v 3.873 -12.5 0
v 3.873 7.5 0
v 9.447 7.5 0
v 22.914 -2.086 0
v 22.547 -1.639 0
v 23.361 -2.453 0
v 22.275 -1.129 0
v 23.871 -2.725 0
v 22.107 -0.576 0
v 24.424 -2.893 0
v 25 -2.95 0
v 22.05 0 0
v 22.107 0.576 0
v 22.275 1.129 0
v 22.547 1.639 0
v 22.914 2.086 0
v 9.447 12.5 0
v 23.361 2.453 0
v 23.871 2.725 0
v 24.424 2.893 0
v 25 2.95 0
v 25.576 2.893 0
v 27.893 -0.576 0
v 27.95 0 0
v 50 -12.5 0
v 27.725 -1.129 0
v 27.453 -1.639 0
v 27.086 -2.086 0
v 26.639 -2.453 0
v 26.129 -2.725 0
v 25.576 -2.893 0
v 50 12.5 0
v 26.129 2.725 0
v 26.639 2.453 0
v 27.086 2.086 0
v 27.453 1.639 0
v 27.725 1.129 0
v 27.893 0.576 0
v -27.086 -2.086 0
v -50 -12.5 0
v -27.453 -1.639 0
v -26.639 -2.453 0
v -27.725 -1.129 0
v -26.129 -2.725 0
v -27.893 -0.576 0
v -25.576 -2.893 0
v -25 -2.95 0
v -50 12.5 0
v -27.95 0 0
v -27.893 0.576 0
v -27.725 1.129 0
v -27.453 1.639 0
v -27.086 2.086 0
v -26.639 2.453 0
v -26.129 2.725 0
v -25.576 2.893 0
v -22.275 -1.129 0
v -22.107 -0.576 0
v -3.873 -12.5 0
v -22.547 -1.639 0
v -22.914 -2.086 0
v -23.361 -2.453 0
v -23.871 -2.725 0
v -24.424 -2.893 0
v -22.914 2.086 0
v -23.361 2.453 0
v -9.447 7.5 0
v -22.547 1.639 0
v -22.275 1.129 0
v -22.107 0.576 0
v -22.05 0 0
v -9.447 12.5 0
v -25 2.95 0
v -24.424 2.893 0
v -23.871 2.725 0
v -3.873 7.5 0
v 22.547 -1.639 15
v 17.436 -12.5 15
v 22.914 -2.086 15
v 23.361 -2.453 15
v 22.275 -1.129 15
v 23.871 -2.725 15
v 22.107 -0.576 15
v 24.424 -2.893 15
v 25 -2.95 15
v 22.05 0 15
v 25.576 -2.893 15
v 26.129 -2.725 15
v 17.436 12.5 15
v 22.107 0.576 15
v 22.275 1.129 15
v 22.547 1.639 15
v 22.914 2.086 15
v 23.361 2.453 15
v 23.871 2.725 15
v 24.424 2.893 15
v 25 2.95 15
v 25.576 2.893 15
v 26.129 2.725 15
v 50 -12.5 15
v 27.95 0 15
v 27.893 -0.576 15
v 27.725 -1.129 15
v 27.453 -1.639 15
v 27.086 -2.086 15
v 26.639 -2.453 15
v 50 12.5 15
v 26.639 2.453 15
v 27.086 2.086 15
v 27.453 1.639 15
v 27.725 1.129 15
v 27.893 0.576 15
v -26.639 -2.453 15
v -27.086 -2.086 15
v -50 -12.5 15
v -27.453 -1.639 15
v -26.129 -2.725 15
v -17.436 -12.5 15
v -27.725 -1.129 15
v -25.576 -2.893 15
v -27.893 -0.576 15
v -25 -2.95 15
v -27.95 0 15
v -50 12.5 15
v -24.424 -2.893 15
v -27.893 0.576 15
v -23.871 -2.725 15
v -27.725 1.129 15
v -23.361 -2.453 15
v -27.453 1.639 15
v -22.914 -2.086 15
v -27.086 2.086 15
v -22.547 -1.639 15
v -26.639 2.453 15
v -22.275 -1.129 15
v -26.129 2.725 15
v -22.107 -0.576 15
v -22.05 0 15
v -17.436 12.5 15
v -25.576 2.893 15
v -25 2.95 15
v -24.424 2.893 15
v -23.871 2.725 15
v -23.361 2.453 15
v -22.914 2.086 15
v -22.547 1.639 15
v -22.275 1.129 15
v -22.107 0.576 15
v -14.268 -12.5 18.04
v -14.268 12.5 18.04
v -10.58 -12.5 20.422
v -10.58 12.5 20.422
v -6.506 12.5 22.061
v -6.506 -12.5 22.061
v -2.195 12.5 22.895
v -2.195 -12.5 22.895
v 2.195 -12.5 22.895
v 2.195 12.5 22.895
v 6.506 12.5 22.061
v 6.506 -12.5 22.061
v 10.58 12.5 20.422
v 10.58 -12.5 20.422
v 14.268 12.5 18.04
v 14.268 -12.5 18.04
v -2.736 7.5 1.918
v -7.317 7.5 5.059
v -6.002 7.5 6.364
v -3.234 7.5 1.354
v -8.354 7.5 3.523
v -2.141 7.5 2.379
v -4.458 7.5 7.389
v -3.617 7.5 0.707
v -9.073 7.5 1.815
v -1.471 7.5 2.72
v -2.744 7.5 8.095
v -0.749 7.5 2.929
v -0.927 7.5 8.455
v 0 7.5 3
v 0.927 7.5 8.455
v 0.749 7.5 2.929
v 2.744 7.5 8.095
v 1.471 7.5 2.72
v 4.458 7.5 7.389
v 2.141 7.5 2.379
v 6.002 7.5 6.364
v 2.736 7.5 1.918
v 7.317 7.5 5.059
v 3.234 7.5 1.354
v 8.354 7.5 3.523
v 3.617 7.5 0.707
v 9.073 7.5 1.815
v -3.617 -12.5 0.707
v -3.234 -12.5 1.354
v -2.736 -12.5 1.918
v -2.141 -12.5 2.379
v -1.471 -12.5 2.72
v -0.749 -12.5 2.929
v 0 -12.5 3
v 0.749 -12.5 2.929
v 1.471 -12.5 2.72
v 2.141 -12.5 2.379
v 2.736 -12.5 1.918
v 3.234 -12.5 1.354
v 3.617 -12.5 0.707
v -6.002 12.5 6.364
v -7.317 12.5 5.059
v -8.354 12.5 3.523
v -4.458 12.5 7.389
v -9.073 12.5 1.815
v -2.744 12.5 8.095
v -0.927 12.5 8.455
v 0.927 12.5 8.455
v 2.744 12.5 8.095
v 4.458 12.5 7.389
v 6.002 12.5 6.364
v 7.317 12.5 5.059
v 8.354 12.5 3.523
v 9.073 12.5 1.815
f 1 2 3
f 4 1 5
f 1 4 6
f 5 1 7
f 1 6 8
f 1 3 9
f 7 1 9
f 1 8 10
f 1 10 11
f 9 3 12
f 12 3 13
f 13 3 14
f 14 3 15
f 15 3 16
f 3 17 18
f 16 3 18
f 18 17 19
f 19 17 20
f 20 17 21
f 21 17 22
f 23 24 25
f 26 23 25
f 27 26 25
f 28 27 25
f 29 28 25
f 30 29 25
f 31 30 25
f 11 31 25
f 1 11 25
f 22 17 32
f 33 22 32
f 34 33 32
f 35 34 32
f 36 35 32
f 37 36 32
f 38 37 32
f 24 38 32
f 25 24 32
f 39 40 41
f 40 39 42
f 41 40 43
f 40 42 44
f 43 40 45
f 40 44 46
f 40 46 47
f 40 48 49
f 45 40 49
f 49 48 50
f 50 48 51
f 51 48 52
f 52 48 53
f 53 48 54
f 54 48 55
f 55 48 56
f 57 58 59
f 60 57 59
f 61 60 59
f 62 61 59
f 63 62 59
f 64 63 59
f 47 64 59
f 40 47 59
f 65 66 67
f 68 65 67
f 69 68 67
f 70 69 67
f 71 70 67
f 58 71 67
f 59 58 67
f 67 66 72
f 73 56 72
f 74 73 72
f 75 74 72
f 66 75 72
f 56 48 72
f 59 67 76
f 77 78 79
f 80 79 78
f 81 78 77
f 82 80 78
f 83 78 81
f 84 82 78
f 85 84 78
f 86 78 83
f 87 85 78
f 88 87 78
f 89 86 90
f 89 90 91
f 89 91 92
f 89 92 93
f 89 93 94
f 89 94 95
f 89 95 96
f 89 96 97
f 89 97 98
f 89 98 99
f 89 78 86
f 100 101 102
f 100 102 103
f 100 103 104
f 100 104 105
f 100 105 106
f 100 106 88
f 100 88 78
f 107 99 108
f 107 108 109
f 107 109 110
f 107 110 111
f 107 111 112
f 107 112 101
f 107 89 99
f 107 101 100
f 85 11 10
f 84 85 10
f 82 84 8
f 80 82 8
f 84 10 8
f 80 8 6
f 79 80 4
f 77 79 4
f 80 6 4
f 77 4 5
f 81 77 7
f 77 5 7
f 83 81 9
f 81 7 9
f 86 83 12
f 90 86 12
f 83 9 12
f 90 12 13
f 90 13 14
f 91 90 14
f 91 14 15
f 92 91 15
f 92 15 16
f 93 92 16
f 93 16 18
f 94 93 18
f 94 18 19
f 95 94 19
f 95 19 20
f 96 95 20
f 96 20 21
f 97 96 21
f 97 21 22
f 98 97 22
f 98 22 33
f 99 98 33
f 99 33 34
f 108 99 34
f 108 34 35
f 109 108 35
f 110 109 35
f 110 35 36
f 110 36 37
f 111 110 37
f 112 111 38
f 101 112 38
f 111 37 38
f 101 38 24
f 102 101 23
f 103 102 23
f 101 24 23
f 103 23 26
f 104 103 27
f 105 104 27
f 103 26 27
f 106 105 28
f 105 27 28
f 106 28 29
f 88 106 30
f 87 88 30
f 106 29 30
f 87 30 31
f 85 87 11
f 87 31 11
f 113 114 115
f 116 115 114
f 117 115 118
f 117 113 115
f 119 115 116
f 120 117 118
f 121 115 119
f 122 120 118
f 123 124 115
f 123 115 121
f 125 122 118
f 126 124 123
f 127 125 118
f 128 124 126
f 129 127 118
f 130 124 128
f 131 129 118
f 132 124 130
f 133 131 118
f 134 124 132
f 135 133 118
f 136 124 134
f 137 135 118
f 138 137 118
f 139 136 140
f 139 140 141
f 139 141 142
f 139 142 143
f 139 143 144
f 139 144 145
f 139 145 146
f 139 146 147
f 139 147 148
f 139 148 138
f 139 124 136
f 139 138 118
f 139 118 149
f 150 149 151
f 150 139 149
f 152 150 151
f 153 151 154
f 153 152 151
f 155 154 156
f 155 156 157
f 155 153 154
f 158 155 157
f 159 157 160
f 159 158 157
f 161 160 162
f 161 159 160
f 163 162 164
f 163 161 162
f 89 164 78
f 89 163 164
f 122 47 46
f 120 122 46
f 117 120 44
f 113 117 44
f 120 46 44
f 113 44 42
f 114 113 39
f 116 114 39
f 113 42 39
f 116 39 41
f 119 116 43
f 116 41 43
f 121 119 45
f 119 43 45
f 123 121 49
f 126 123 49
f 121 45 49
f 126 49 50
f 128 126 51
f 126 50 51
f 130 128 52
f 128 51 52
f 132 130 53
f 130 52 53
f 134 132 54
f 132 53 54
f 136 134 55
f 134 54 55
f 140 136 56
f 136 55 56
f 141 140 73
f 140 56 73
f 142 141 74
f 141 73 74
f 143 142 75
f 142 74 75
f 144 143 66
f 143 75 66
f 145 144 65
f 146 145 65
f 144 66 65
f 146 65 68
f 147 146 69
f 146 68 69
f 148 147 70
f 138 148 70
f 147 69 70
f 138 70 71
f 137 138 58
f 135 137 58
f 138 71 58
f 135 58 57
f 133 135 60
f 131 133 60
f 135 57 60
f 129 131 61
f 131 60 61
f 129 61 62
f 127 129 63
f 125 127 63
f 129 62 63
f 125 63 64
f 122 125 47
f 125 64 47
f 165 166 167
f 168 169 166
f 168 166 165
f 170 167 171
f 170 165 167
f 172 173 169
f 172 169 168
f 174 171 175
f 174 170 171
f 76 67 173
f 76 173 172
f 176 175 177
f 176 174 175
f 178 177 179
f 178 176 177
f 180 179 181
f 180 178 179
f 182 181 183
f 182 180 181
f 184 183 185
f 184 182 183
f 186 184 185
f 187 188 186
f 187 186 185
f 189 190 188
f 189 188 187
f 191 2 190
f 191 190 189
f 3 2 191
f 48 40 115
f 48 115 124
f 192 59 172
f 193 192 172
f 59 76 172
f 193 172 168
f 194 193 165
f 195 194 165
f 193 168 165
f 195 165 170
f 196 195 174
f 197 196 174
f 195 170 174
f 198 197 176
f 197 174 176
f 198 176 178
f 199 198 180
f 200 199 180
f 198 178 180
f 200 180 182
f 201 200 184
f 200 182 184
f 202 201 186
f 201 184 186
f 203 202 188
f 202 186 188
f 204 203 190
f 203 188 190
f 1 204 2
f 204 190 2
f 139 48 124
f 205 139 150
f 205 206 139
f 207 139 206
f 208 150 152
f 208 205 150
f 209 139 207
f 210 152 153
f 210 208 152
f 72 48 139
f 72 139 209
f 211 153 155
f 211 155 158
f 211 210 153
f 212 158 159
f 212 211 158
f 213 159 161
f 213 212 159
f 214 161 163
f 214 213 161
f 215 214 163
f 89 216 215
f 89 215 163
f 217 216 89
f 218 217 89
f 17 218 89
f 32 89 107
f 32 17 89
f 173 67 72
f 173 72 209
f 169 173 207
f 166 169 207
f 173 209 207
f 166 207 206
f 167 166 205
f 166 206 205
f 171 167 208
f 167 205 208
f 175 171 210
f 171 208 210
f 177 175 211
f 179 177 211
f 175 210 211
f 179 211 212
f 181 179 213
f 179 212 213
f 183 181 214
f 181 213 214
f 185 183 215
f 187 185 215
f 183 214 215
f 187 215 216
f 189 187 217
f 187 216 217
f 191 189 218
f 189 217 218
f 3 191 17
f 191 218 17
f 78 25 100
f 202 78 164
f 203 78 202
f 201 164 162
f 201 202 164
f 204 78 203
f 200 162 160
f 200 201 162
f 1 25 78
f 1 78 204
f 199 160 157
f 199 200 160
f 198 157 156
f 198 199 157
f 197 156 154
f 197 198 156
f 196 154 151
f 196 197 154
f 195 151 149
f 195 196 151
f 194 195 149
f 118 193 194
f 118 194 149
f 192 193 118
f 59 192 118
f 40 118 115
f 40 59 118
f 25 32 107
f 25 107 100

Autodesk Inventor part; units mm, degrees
ref_plane "YZ Plane" through (0, 0, 0) normal (1, 0, 0) x (0, 1, 0)
ref_plane "XZ Plane" through (0, 0, 0) normal (0, 1, 0) x (-1, 0, 0)
ref_plane "XY Plane" through (0, 0, 0) normal (0, 0, 1) x (1, 0, 0)
sketch "Schizzo1" plane through (0, 0, 0) normal (0, 0, 1) x (1, 0, 0)
  line L0 (50, -12.5) -> (-50, -12.5)
  line L1 (-50, -12.5) -> (-50, 12.5)
  line L2 (-50, 12.5) -> (50, 12.5)
  line L3 (50, 12.5) -> (50, -12.5)
  line L4 (50, -12.5) -> (-50, 12.5) construction
  line L5 (-50, -12.5) -> (50, 12.5) construction
  point P0 (0, 0)
  dimension "d0" = 100
  dimension "d1" = 25
extrude "Estrusione1" add sketch "Schizzo1" along normal blind 15
sketch "Schizzo2" plane through (-50, 12.5, 0) normal (0, 1, 0) x (1, 0, 0)
  line L0 (50, 0) -> (50, 1)
  line L1 (50, 0) -> (51, 0) construction
  circle A0 centre (50, 1) radius 9.5
  dimension "d4" = 1
  dimension "d5" = 90
  dimension "d6" = 19
extrude "Estrusione2" cut sketch "Schizzo2" against normal blind 5
sketch "Schizzo3" plane through (-50, 7.5, 0) normal (0, 1, 0) x (1, 0, 0)
  line L0 (50, 0) -> (50, 1)
  line L1 (50, 0) -> (51, 0) construction
  circle A0 centre (50, 1) radius 4
  dimension "d9" = 1
  dimension "d10" = 90
  dimension "d11" = 8
extrude "Estrusione3" cut sketch "Schizzo3" against normal blind 20
sketch "Schizzo4" plane through (0, 0, 15) normal (0, 0, 1) x (1, 0, 0)
  line L0 (-25, 0) -> (25, 0)
  line L1 (-25, 0) -> (25, 0) construction
  line L2 (50, 12.5) -> (-50, 12.5) projected
  point P0 (0, 0)
  point P1 (0, 0)
  dimension "d14" = 50
  dimension "d15" = 0
hole "Foro1" at (-25, 0, 15) at (25, 0, 15) direction (0, 0, -1) diameter 5.9 end through all clearance for "Bullone a testa esagonale" size "M5" standard "ANSI - Profilo M Metrico"
sketch "Schizzo5" plane through (-50, 12.5, 15) normal (0, 1, 0) x (1, 0, 0)
  circle A0 centre (50, 15) radius 23
  line L0 (100, 0) -> (0, 0) projected
  line L1 (67.4356, 0) -> (32.5644, 0)
  point P0 (50, 15)
  dimension "d23" = 46
extrude "Estrusione4" add sketch "Schizzo5" against normal blind 25 contours L0 A0 picked at (45.5796, -1.264)
properties part number "20_Base_Sopra" material "PLA(Stampato)(D0,646)"
